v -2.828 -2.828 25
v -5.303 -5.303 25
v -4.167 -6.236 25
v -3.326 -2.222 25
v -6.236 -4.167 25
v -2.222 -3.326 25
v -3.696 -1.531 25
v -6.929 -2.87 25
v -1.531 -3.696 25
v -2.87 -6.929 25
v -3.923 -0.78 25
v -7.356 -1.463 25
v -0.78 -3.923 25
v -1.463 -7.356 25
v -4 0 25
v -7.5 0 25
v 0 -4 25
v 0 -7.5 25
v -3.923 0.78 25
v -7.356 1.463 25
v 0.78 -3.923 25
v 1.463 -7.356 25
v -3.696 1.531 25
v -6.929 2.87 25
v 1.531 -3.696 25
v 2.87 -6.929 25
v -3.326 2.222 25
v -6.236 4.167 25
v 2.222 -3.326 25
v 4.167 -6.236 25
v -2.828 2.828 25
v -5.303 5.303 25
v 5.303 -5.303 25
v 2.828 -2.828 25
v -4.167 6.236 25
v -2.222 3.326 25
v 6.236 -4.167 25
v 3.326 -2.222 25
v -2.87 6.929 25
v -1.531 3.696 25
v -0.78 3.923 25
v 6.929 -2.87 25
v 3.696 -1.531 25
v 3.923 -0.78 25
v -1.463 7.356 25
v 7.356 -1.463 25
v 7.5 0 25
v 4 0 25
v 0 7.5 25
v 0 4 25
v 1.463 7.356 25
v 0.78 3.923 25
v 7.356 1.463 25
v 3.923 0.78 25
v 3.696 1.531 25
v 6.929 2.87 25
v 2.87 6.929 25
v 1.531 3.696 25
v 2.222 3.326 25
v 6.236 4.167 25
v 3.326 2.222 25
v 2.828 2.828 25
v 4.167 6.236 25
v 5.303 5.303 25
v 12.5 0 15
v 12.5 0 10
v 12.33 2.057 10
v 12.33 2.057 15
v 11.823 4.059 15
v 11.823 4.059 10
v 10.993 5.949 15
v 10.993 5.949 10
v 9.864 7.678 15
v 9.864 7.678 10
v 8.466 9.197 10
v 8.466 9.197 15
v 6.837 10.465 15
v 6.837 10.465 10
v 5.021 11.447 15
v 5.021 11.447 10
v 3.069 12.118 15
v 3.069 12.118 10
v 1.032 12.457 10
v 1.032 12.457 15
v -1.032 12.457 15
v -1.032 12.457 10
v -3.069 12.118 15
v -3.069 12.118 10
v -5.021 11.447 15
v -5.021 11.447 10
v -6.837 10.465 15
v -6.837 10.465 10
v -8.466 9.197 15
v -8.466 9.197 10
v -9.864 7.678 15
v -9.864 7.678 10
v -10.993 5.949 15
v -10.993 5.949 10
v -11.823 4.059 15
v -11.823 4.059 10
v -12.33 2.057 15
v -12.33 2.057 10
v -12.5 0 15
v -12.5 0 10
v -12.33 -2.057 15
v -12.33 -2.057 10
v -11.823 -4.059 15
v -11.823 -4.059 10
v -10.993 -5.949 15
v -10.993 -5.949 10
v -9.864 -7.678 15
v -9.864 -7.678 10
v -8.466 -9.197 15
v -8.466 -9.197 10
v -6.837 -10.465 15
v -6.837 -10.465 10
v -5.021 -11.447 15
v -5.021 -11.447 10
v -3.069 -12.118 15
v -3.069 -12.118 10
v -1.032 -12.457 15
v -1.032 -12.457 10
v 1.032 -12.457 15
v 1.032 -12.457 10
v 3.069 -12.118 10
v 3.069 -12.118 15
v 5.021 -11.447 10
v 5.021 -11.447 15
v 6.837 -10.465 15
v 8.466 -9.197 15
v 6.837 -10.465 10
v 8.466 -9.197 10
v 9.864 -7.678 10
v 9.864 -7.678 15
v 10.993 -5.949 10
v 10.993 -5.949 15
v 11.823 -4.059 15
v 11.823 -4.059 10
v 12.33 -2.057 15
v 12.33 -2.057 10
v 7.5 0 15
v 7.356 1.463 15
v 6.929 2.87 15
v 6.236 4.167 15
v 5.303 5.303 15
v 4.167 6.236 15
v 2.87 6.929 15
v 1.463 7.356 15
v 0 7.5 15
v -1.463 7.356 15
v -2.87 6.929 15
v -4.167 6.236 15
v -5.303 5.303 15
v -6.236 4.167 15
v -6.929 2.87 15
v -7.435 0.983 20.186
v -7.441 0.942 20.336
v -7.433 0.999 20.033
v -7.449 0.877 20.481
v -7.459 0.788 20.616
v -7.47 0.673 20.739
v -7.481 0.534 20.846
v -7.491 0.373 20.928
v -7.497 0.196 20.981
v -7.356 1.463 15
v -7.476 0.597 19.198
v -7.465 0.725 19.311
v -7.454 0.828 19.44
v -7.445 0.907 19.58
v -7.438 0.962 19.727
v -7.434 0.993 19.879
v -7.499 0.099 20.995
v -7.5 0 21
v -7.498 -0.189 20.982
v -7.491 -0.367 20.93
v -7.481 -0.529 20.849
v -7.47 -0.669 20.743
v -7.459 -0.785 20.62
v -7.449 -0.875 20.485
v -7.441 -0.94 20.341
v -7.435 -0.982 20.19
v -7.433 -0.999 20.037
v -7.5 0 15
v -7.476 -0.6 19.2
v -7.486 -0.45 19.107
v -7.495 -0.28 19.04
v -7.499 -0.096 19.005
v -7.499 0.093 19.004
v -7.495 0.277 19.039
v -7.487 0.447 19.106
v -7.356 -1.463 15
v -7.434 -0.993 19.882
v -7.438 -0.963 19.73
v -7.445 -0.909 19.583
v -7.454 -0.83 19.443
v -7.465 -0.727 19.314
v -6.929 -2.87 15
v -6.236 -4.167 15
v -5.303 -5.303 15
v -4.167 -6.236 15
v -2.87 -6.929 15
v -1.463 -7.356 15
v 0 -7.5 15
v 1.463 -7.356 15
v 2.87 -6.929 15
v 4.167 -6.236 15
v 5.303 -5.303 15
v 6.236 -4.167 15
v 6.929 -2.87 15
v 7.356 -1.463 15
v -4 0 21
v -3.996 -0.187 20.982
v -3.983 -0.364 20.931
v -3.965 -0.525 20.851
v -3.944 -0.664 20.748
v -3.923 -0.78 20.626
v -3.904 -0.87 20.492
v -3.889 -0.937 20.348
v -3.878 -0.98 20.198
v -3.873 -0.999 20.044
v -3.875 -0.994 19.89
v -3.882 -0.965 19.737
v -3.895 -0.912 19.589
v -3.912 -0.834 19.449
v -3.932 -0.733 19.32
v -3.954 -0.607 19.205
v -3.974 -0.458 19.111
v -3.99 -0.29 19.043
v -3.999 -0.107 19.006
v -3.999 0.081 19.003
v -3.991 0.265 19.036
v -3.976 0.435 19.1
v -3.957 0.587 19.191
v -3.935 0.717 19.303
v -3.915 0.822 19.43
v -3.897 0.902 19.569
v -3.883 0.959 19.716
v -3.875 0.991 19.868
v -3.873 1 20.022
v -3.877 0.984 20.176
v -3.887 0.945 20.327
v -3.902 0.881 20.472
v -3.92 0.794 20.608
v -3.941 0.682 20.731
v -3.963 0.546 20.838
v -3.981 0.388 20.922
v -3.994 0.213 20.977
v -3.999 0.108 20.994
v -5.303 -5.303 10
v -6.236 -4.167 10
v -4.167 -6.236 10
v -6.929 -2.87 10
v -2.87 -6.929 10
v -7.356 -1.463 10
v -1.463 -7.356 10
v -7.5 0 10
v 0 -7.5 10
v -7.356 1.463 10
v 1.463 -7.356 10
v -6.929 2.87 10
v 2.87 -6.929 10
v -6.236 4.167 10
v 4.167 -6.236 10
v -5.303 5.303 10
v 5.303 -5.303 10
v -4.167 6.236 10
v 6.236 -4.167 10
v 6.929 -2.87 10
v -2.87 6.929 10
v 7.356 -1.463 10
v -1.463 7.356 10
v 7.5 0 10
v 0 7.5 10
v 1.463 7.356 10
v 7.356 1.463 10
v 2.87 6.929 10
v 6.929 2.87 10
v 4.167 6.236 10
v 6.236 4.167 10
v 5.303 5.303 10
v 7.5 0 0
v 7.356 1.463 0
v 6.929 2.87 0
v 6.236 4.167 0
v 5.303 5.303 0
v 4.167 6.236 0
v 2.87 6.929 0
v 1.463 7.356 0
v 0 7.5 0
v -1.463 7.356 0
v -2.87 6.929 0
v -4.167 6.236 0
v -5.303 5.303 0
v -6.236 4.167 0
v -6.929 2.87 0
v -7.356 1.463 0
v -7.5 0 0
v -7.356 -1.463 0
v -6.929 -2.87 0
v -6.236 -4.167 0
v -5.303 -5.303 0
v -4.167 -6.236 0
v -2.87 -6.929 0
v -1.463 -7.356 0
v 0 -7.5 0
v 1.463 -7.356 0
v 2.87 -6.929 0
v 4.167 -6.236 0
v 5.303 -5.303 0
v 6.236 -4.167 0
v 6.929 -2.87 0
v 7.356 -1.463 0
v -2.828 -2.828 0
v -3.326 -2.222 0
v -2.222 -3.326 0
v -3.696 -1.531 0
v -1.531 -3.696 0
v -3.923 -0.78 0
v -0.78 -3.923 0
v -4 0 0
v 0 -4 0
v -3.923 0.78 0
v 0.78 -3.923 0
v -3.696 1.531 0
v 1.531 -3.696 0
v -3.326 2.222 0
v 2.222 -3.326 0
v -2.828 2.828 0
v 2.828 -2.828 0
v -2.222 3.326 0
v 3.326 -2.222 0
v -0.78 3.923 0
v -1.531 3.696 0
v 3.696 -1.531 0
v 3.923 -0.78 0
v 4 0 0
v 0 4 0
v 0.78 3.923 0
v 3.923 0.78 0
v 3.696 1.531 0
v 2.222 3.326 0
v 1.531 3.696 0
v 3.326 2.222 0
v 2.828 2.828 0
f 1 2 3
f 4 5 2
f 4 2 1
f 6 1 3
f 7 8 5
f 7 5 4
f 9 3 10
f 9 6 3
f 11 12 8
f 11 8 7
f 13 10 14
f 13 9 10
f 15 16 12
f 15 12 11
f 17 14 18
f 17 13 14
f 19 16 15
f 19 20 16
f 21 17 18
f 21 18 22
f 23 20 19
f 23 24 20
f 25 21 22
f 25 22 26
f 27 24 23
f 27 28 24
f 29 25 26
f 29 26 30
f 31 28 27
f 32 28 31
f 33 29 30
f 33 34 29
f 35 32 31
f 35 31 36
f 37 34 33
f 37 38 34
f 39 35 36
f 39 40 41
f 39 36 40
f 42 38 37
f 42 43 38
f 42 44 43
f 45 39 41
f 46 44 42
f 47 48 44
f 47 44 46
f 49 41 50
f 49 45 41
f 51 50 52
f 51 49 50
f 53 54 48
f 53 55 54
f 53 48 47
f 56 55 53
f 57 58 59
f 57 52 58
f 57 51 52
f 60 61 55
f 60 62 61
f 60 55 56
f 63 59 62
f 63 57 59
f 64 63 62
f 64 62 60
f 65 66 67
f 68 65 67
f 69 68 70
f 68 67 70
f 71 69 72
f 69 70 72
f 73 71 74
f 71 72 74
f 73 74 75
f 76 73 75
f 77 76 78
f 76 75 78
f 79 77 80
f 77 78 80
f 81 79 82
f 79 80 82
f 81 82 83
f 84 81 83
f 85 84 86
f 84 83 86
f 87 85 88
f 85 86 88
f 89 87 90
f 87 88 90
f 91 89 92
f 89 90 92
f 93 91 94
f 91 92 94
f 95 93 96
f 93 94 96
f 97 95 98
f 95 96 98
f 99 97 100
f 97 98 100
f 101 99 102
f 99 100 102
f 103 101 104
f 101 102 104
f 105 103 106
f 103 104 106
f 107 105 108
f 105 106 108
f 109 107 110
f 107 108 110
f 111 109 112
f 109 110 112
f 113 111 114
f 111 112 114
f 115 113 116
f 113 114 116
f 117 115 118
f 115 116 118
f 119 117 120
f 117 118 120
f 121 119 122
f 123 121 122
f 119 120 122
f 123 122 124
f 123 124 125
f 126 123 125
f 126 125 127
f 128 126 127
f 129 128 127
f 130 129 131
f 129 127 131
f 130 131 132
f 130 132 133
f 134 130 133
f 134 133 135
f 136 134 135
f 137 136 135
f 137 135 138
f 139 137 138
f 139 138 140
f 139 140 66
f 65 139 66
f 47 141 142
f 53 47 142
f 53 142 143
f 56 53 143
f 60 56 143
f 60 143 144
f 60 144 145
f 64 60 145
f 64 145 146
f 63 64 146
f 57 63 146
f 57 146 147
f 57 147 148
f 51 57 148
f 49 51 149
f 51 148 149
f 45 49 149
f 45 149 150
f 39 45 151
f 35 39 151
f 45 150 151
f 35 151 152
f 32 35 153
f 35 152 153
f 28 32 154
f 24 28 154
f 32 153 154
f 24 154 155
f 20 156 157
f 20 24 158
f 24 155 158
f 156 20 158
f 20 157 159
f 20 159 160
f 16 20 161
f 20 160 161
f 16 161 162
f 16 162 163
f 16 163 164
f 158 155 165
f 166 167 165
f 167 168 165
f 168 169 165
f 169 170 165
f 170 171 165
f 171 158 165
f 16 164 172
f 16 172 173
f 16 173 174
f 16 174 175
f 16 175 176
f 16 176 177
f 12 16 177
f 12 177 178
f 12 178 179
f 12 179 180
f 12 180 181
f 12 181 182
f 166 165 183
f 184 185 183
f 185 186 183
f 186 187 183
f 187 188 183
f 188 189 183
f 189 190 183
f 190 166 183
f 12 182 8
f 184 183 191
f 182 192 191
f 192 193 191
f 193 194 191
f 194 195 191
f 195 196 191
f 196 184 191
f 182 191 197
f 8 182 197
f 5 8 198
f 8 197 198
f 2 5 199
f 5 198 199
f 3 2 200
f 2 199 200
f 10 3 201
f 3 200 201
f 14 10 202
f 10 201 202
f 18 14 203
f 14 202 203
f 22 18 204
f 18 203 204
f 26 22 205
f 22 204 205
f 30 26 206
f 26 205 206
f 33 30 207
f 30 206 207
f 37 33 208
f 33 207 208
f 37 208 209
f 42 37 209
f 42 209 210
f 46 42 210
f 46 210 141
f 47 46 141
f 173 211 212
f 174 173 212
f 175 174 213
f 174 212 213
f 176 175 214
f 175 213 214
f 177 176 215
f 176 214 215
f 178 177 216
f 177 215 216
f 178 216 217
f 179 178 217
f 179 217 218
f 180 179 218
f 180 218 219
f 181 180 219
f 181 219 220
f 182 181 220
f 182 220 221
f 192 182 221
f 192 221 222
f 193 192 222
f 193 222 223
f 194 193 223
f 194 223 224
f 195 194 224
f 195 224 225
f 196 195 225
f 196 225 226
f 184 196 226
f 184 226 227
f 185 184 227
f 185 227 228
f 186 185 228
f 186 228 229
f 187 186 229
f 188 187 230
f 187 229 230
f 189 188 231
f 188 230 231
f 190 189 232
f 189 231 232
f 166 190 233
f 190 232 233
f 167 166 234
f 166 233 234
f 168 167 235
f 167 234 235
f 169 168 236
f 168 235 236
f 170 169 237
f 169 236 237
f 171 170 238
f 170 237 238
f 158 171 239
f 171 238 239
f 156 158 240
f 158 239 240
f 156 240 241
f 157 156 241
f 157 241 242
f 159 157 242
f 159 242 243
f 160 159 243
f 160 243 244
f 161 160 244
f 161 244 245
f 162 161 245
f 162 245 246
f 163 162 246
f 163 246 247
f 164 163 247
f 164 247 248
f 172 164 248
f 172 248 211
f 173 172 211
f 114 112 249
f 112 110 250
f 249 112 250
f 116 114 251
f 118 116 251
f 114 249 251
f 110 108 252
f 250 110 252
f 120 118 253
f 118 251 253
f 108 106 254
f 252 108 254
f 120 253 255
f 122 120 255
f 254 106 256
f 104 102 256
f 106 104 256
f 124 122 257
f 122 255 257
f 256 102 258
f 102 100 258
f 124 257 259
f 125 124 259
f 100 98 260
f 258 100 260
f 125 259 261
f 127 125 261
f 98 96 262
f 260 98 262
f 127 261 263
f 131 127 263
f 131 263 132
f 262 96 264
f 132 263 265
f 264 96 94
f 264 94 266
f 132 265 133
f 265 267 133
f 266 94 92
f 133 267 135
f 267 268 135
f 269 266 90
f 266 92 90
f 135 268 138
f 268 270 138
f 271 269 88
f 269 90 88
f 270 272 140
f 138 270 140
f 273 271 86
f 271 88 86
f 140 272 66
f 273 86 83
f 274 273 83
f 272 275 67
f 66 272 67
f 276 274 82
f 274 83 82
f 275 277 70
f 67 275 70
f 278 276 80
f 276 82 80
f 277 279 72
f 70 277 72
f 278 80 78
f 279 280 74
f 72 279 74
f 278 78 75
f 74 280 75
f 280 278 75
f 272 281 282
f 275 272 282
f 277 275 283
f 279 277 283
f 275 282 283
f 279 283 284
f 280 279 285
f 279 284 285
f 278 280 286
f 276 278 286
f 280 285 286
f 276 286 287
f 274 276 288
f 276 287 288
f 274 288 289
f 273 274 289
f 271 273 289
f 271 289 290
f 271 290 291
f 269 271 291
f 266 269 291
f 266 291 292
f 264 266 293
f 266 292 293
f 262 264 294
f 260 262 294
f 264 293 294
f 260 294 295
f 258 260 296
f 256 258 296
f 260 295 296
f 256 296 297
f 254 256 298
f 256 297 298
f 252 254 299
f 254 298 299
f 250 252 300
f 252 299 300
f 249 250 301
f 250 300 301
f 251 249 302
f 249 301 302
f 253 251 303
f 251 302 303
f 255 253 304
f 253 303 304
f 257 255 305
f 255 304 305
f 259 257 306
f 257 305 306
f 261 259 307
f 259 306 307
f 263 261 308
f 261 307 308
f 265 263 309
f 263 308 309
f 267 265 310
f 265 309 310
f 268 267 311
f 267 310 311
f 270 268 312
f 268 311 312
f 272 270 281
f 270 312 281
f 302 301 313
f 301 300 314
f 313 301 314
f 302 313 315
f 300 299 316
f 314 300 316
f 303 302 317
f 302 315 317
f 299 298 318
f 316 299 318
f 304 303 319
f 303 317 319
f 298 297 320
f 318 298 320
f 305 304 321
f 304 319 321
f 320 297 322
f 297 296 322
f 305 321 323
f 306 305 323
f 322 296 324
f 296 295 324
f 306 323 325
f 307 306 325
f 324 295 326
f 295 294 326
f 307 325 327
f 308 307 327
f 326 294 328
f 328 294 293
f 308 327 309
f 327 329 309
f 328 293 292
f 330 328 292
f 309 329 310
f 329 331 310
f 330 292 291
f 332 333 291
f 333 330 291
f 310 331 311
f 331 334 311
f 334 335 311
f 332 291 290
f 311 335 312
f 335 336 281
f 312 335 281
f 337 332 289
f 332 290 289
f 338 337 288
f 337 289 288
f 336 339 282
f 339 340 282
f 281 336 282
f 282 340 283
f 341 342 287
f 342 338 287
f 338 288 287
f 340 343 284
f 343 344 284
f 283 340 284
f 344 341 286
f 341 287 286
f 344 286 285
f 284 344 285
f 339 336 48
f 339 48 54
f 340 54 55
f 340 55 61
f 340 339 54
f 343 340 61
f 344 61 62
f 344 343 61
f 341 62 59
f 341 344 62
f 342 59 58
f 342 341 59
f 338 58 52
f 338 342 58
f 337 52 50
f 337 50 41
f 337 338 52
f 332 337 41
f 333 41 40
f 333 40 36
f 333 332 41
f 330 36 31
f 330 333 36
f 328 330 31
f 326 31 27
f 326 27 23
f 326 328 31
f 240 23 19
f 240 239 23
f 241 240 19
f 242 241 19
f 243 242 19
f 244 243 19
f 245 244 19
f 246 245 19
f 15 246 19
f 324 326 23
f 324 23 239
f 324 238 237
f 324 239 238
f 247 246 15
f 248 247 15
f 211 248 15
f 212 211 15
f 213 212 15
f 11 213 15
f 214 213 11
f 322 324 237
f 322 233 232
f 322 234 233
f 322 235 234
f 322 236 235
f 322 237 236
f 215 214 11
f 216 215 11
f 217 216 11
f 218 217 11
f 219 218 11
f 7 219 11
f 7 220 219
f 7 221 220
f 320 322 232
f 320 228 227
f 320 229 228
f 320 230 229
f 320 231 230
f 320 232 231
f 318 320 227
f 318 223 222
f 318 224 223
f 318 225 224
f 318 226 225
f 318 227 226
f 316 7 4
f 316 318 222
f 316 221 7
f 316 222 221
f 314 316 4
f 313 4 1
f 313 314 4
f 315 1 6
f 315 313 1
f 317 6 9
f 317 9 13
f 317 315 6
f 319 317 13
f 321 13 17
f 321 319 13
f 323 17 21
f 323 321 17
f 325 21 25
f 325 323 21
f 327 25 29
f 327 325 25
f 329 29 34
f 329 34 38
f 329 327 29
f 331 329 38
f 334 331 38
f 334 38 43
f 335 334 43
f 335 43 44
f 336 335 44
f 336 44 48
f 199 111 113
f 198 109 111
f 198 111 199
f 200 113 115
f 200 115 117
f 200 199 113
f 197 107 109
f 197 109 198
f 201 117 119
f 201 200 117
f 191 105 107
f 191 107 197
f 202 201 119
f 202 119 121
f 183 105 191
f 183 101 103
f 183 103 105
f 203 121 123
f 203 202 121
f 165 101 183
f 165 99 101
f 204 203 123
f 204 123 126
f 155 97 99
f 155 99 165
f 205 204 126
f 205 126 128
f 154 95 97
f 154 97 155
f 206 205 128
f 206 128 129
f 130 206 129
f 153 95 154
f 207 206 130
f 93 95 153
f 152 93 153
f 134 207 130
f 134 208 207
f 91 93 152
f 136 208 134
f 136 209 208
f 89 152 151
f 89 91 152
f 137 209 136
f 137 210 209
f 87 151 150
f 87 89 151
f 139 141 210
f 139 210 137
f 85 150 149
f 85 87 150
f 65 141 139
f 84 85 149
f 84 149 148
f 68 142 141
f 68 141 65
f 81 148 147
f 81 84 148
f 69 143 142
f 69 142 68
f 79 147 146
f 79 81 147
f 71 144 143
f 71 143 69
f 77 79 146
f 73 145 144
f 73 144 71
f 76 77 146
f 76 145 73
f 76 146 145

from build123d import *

# Parameters (mm, degrees)
SKETCH1_R           = 7.5
SKETCH1_R_2         = 4
BOSS_EXTRUDE1_DEPTH = 10
SKETCH3_R           = 12.5
SKETCH3_R_2         = 4
BOSS_EXTRUDE2_DEPTH = 5
SKETCH4_R           = 7.5
SKETCH4_R_2         = 4
BOSS_EXTRUDE3_DEPTH = 10
SKETCH5_R           = 1
CUT_EXTRUDE1_DEPTH  = 10


with BuildPart() as part:
    # Sketch1 → Boss-Extrude1 (new body)
    with BuildSketch(Plane.XY):
        Circle(SKETCH1_R)
        Circle(SKETCH1_R_2, mode=Mode.SUBTRACT)
    extrude(amount=BOSS_EXTRUDE1_DEPTH)

    # Sketch3 → Boss-Extrude2 (add)
    with BuildSketch(Plane.XY.offset(10)):
        Circle(SKETCH3_R)
        Circle(SKETCH3_R_2, mode=Mode.SUBTRACT)
    extrude(amount=BOSS_EXTRUDE2_DEPTH)

    # Sketch4 → Boss-Extrude3 (add)
    with BuildSketch(Plane.XY.offset(15)):
        Circle(SKETCH4_R)
        Circle(SKETCH4_R_2, mode=Mode.SUBTRACT)
    extrude(amount=BOSS_EXTRUDE3_DEPTH)

    # Sketch5 → Cut-Extrude1 (cut)
    with BuildSketch(Plane(origin=(0, 0, 0), x_dir=(0, 0, -1), z_dir=(1, 0, 0))):
        with Locations(Location((-20, 0, 0), (0, 0, 180))):
            Circle(SKETCH5_R)
    extrude(amount=-CUT_EXTRUDE1_DEPTH, mode=Mode.SUBTRACT)


solid = part.part
